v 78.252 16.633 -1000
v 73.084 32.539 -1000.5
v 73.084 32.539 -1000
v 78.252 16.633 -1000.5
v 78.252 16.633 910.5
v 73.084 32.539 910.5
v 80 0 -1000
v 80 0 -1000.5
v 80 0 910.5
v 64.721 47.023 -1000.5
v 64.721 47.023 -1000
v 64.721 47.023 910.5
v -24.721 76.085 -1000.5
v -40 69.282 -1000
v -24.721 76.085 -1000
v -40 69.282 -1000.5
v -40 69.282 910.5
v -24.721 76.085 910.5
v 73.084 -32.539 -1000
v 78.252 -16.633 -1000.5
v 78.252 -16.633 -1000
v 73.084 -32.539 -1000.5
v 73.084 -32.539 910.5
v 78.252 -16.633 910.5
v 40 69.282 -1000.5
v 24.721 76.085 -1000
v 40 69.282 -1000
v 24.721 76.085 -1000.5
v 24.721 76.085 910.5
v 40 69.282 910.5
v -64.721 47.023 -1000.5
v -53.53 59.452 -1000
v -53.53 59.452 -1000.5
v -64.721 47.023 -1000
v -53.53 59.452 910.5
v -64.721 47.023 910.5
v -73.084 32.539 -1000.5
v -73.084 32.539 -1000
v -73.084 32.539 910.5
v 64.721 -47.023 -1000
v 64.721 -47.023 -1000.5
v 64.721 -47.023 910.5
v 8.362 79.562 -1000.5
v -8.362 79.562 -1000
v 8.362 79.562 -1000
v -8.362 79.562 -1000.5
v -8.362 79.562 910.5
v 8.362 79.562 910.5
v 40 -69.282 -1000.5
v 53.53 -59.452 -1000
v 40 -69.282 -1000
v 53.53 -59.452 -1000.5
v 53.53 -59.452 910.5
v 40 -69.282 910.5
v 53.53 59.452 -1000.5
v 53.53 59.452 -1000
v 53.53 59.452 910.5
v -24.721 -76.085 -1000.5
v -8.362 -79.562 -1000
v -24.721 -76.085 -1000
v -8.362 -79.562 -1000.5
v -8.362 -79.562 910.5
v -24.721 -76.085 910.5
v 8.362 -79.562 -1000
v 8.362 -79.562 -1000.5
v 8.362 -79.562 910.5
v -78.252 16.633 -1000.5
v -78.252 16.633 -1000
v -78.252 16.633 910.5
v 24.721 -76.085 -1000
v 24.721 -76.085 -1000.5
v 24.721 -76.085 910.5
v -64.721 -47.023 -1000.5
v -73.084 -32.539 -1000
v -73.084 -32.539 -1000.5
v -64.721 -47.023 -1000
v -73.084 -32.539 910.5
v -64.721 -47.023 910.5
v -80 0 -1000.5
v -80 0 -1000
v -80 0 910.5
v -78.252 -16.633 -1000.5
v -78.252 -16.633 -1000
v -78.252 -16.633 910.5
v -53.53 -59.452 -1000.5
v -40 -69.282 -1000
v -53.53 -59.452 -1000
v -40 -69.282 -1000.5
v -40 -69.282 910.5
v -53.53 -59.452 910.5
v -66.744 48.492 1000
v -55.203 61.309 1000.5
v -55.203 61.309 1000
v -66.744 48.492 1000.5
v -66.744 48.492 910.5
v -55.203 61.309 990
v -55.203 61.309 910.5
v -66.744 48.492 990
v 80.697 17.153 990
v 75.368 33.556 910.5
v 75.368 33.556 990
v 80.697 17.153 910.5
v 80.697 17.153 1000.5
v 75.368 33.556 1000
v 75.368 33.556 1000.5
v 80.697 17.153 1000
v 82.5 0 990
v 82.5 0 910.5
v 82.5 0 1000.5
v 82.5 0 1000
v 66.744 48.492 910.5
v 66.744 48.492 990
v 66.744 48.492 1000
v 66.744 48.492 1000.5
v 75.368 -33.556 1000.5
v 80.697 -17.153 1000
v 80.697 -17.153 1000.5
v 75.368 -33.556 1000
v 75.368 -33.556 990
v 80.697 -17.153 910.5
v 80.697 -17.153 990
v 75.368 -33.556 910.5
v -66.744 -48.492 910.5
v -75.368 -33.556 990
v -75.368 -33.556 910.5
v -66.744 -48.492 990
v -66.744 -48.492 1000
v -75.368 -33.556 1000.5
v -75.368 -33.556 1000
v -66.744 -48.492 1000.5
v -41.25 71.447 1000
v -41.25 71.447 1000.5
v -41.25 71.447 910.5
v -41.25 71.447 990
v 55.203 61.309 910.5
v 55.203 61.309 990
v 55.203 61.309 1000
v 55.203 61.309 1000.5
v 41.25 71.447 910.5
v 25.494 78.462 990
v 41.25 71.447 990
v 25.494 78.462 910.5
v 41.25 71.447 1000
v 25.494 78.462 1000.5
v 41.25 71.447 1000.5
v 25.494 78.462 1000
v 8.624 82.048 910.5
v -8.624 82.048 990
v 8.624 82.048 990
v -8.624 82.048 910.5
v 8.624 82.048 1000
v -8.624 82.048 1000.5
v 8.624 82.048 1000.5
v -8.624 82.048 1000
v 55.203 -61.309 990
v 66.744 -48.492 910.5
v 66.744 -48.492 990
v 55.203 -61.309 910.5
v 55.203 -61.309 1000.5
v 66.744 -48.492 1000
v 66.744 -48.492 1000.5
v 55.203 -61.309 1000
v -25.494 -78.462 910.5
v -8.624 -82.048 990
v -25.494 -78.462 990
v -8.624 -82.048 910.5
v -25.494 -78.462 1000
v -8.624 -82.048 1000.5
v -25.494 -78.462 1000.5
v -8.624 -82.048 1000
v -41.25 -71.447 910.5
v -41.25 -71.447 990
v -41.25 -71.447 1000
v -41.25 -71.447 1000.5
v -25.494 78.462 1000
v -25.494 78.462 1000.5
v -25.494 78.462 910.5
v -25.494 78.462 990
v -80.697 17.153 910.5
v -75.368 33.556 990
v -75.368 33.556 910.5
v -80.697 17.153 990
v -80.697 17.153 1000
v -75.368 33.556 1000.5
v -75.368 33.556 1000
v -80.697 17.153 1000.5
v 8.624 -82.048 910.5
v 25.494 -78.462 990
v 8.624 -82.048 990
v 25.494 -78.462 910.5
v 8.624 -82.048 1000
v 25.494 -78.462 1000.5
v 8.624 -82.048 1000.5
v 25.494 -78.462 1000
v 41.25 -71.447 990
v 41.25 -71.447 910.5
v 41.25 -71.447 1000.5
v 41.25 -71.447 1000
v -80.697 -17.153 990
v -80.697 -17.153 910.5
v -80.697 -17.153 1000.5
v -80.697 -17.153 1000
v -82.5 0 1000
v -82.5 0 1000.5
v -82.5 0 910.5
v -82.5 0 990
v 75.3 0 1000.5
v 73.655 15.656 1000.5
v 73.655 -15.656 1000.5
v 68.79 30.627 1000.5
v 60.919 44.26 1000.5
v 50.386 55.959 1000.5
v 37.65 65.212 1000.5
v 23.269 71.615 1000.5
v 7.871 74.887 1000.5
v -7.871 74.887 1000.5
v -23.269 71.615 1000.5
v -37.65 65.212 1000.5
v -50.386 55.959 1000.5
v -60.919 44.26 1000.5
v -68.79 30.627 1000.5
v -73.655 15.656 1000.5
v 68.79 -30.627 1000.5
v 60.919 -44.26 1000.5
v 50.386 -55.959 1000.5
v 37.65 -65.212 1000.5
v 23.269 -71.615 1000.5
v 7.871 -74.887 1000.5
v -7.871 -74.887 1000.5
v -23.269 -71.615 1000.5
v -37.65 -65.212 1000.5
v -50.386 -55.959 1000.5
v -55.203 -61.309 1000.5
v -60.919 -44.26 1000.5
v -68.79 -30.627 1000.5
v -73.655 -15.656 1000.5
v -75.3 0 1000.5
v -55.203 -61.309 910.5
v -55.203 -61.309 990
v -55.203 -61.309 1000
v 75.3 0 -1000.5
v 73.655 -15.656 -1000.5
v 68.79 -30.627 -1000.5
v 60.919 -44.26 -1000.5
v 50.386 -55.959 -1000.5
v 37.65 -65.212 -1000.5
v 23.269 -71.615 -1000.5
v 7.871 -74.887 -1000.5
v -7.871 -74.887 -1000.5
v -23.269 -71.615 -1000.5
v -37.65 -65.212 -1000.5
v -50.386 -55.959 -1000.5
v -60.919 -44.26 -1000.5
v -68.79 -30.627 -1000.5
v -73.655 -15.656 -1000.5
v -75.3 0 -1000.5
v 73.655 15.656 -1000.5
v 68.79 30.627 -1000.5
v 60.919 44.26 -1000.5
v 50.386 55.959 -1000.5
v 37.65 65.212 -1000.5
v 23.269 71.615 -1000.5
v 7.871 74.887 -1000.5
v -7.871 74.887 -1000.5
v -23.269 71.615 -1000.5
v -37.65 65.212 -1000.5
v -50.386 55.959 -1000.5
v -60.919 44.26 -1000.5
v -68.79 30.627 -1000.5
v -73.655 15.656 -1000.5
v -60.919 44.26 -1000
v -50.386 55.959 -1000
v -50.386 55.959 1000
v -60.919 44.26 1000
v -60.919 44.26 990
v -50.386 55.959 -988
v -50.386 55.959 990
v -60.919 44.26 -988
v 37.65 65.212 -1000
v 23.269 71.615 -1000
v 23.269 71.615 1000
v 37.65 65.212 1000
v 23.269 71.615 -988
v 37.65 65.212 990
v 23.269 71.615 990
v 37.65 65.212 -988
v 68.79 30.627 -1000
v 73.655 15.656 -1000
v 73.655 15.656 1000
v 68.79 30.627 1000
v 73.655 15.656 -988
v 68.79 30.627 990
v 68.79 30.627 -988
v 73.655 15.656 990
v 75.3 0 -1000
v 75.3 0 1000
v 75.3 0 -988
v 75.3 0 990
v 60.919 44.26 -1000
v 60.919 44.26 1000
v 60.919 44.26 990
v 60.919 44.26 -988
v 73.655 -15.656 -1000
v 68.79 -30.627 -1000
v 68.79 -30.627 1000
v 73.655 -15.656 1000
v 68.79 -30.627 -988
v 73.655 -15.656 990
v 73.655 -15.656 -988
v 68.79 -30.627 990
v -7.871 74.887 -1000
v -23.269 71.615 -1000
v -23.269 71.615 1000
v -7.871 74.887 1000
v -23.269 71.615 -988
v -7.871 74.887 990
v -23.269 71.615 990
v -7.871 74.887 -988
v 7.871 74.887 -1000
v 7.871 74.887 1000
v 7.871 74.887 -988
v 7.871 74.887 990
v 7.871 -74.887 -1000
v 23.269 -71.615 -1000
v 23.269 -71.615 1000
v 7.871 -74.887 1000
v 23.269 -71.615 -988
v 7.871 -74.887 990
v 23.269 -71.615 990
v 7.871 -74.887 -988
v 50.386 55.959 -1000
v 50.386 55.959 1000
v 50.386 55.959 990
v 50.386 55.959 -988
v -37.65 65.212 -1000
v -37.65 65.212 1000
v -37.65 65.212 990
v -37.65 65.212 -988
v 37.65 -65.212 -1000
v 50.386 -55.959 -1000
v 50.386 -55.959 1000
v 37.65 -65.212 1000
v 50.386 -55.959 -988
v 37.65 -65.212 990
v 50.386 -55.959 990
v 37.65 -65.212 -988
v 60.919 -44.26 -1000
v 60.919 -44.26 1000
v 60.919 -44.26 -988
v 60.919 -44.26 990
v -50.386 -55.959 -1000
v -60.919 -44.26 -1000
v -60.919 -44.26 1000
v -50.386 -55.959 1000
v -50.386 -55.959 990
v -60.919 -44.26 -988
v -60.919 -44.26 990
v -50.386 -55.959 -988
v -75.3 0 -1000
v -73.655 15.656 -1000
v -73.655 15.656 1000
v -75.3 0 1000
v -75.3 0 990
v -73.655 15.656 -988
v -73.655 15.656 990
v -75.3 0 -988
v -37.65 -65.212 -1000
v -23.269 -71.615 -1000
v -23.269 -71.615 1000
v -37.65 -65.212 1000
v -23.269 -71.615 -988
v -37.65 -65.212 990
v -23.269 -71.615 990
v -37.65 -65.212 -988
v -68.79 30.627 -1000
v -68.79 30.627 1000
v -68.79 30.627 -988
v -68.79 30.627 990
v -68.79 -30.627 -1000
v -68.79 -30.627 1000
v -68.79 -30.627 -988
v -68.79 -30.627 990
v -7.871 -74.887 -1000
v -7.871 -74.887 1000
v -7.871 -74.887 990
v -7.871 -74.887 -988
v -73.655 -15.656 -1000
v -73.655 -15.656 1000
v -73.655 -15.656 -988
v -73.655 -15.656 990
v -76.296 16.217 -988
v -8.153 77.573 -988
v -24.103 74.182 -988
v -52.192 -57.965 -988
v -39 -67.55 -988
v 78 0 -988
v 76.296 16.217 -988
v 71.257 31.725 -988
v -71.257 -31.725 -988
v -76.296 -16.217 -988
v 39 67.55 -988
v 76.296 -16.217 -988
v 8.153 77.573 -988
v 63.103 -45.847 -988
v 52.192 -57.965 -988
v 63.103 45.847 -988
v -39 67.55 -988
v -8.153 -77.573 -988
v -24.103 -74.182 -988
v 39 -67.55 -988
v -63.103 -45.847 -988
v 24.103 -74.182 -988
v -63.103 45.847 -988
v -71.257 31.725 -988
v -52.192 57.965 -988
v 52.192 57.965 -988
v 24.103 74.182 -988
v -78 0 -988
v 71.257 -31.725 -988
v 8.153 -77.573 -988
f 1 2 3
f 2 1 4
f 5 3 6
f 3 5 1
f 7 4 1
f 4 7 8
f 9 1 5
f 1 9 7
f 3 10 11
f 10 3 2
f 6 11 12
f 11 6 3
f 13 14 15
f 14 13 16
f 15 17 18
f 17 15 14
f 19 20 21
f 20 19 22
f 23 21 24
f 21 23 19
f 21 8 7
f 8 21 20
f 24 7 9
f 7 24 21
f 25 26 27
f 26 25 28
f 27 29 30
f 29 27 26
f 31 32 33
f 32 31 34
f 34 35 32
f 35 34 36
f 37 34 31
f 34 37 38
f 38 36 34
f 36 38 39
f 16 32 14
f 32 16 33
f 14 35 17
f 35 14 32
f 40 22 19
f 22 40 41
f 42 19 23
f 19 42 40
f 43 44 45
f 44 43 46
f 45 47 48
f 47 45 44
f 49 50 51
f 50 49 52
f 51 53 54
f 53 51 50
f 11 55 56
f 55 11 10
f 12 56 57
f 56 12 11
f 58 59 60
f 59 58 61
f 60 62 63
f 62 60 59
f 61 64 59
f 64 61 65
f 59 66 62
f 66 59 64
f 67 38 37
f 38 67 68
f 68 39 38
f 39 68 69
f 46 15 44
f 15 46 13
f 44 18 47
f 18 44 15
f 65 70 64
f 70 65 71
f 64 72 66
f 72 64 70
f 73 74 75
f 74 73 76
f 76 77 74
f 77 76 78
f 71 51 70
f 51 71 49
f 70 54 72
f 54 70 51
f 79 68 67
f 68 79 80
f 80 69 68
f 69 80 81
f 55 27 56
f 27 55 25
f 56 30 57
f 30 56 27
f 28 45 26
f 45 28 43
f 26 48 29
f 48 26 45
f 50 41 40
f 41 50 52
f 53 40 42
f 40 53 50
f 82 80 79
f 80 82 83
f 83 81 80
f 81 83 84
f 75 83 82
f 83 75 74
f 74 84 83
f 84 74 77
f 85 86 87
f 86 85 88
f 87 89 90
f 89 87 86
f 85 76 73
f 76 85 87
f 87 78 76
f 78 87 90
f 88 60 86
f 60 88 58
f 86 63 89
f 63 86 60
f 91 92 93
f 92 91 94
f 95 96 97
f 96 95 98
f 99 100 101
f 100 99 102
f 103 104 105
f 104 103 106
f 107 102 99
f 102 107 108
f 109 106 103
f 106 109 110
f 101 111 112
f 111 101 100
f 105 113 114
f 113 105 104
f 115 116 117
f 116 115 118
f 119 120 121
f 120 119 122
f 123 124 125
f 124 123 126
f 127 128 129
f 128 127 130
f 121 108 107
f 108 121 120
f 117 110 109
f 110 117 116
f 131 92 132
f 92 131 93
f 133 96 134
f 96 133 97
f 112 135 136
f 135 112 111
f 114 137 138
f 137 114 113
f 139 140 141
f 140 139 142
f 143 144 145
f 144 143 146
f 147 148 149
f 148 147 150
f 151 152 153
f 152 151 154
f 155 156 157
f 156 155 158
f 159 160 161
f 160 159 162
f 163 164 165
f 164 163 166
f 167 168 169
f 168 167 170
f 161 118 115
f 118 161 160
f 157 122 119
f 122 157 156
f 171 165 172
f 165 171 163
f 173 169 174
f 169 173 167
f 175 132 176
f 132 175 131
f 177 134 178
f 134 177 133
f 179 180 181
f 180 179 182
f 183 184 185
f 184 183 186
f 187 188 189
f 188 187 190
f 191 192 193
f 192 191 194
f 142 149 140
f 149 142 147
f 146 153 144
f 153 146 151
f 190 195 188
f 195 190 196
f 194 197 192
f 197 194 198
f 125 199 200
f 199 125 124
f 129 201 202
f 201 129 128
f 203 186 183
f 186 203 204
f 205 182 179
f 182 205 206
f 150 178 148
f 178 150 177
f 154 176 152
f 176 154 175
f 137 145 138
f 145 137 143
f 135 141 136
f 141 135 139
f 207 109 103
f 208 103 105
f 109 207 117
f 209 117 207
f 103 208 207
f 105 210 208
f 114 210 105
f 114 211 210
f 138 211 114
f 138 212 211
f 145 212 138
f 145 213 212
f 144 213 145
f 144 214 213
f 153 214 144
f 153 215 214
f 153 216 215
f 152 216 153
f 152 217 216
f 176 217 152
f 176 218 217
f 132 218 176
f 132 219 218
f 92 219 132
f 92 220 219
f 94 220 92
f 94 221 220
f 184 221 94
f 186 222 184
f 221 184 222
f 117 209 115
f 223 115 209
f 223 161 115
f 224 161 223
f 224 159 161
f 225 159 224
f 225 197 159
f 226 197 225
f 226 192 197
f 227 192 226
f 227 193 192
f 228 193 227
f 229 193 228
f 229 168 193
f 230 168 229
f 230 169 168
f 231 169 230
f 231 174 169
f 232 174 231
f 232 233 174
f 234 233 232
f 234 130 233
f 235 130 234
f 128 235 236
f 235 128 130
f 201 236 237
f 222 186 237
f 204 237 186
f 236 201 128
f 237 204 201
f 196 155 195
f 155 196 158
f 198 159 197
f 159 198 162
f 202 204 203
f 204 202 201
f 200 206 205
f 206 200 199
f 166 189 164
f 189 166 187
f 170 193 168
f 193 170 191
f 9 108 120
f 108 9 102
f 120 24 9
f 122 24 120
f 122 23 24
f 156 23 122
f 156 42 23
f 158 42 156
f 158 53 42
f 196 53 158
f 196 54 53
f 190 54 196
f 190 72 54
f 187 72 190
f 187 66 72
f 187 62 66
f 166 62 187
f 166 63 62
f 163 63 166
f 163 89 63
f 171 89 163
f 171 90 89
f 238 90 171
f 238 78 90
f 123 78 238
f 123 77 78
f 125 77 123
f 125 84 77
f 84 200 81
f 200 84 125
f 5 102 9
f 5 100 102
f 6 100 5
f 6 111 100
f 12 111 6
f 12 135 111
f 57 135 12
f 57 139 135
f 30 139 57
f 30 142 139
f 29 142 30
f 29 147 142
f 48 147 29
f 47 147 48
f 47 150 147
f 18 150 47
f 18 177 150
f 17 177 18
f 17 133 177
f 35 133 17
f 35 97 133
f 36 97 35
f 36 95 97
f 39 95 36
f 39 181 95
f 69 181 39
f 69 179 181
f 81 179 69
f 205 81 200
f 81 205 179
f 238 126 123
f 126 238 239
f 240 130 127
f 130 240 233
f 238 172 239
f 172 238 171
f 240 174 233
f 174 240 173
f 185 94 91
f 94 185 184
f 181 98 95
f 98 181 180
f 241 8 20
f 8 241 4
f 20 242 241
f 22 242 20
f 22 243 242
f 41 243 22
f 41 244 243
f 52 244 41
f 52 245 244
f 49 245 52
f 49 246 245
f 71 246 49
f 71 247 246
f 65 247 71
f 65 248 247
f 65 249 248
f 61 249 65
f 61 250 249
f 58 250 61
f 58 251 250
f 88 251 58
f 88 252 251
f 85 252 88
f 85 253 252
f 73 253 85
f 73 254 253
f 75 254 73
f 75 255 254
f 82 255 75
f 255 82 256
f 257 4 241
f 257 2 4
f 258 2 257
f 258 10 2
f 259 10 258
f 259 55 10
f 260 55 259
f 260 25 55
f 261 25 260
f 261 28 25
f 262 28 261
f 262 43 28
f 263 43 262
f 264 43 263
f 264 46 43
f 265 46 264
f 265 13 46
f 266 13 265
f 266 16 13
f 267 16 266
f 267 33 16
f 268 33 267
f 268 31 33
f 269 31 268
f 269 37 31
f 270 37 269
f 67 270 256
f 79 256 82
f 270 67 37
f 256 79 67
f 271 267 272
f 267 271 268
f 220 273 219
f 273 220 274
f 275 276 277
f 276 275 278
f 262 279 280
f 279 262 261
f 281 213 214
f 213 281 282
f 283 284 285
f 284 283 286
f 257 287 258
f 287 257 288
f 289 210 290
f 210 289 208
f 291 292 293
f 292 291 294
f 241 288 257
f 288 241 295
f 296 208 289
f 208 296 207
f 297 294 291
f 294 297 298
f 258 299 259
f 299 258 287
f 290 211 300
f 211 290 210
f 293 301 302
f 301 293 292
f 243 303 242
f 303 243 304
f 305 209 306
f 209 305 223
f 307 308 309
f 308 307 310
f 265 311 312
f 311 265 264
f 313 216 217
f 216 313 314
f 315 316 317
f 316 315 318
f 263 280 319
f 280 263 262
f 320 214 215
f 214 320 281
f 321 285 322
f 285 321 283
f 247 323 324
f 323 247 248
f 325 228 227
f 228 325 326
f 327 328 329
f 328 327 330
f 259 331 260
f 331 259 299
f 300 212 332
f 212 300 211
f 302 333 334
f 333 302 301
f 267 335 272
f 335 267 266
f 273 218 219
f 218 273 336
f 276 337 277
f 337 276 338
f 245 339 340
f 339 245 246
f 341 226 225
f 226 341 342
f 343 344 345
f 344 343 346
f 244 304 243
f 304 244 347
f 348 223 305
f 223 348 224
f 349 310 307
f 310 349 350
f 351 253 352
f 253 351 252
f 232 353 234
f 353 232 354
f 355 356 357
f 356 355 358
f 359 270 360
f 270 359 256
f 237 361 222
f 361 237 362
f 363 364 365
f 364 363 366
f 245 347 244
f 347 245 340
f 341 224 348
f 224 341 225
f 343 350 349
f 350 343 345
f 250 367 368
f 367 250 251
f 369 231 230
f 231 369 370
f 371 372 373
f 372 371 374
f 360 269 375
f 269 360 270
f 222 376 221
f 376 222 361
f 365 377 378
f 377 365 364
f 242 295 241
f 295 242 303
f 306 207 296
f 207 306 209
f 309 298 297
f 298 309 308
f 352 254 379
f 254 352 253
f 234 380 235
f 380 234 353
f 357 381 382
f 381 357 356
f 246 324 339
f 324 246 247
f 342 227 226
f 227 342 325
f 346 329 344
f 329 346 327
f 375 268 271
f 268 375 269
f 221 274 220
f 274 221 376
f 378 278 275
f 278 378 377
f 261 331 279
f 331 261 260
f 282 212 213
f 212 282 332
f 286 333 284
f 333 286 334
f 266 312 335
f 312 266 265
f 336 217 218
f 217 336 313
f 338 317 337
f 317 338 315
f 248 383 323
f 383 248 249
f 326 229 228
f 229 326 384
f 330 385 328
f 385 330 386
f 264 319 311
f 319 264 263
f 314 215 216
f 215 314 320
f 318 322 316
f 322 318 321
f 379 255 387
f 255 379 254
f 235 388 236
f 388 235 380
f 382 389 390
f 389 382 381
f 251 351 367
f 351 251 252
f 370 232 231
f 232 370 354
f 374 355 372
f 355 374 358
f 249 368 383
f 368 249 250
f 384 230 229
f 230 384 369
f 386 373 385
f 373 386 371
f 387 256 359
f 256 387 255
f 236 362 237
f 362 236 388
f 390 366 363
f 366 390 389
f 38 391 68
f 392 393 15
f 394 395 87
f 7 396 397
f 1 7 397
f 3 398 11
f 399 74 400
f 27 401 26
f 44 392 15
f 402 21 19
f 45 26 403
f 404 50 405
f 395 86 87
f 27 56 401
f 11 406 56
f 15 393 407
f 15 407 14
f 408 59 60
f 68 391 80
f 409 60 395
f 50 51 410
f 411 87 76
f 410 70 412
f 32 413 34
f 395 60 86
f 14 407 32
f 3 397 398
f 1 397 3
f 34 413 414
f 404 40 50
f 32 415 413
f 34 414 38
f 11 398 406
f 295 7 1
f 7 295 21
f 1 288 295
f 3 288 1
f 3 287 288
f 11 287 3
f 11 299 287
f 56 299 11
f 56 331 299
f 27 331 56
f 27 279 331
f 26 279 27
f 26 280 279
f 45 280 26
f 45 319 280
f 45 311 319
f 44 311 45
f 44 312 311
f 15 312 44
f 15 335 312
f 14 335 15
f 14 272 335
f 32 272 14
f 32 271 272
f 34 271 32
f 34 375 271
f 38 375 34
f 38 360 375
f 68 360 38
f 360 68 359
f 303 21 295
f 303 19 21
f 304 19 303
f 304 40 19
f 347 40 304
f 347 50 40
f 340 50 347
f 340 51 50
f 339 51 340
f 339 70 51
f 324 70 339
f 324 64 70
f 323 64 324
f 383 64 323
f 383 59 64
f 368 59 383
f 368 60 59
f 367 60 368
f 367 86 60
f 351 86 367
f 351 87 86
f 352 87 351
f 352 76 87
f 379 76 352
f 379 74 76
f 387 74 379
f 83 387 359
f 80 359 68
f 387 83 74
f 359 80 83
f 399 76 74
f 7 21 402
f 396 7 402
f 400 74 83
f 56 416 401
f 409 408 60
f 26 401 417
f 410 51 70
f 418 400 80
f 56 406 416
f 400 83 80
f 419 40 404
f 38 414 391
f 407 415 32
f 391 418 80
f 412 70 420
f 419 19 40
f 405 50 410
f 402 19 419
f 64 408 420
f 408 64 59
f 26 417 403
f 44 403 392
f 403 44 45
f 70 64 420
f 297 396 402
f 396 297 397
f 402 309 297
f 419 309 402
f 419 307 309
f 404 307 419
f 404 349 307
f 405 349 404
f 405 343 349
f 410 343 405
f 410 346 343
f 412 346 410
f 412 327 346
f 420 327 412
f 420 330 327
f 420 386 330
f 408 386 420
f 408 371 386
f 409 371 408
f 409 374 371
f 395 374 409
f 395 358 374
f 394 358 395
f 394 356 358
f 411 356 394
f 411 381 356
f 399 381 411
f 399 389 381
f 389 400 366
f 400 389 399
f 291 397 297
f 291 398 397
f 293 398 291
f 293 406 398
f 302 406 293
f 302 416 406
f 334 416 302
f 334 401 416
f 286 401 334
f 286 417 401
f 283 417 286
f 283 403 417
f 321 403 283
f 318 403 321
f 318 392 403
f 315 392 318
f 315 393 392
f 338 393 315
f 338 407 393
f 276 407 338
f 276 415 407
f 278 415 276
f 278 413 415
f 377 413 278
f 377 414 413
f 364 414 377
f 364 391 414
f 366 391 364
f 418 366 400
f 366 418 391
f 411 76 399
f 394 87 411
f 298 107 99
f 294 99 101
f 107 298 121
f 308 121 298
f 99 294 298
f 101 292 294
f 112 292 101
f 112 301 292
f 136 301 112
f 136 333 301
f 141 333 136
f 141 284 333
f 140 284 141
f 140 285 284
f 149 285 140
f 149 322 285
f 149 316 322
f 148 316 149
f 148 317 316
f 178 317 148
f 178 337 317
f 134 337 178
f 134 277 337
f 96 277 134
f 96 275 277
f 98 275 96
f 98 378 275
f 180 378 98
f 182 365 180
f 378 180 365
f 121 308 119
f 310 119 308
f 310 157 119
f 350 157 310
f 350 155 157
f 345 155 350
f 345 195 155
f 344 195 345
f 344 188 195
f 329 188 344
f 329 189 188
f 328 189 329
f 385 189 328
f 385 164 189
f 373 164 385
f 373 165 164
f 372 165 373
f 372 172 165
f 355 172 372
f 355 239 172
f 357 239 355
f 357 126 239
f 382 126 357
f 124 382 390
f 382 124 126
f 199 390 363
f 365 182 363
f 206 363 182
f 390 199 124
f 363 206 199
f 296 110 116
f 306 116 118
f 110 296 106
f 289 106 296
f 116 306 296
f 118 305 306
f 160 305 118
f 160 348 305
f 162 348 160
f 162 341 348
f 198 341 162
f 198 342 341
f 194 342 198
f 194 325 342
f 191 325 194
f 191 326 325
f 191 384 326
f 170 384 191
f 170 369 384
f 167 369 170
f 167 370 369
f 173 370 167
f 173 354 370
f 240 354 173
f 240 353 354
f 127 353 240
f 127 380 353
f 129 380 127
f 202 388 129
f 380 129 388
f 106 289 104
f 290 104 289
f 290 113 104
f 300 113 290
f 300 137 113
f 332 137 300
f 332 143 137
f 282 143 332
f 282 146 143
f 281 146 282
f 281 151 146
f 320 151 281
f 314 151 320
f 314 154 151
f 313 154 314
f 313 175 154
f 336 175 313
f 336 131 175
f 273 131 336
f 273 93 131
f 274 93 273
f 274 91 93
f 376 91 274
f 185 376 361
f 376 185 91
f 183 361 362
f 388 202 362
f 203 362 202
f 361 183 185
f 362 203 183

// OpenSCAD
// Parameters
pipe_length = 2000; //[1000:4000:10]
outer_diameter = 160; //[80:320:1]
wall_thickness = 4.7; //[2.35:9.4:0.1]
socket_length = 90; //[45:180:1]
socket_wall_extra = 2.5; //[1.0:6.0:0.1]
spigot_chamfer_length = 12; //[6:30:1]
spigot_chamfer_radial = 2.0; //[0.8:5.0:0.1]
socket_chamfer_length = 10; //[5:25:1]
socket_chamfer_radial = 2.0; //[0.8:5.0:0.1]
mark_band_width = 6; //[3:15:1]
mark_band_height = 0.6; //[0.2:1.5:0.1]
mark_band_offset_from_socket = 25; //[10:80:1]
overlap = 1.0; //[0.5:2.0:0.1]

// Base Shapes
module pipe_body() {
  cylinder(h=pipe_length, r=outer_diameter/2, center=true);
}

module pipe_bore() {
  cylinder(h=pipe_length + 2*overlap, r=outer_diameter/2 - wall_thickness, center=true);
}

module socket_end() {
  translate([0, 0, pipe_length/2 - socket_length/2 + overlap/2])
    cylinder(h=socket_length, r=outer_diameter/2 + socket_wall_extra, center=true);
}

module spigot_end() {
  translate([0, 0, -pipe_length/2 + socket_length/2 - overlap/2])
    cylinder(h=socket_length, r=outer_diameter/2, center=true);
}

module spigot_chamfer_cutter() {
  translate([0, 0, -pipe_length/2 + spigot_chamfer_length/2])
    cylinder(h=spigot_chamfer_length, r1=outer_diameter/2, r2=outer_diameter/2 - spigot_chamfer_radial, center=true);
}

module socket_mouth_chamfer_cutter() {
  translate([0, 0, pipe_length/2 - socket_chamfer_length/2])
    cylinder(h=socket_chamfer_length, r1=outer_diameter/2 + socket_wall_extra + socket_chamfer_radial, r2=outer_diameter/2 + socket_wall_extra, center=true);
}

module marking_band(position_z) {
  translate([0, 0, position_z])
    scale([1, 1, mark_band_width/(mark_band_height + overlap)])
      rotate_extrude() translate([outer_diameter/2 + mark_band_height/2, 0, 0]) circle(r=mark_band_height/2);
}

// Operations
module pipe_outer_with_ends() {
  union() {
    pipe_body();
    socket_end();
    spigot_end();
  }
}

module pipe_hollow() {
  difference() {
    pipe_outer_with_ends();
    pipe_bore();
  }
}

module pipe_with_chamfers() {
  difference() {
    pipe_hollow();
    spigot_chamfer_cutter();
    socket_mouth_chamfer_cutter();
  }
}

module pipe_complete() {
  union() {
    pipe_with_chamfers();
    marking_band(pipe_length/2 - mark_band_offset_from_socket);
    marking_band(pipe_length/2 - mark_band_offset_from_socket - (mark_band_width + 2*overlap));
    marking_band(pipe_length/2 - mark_band_offset_from_socket - 2*(mark_band_width + 2*overlap));
  }
}

// Final Output
pipe_complete();
